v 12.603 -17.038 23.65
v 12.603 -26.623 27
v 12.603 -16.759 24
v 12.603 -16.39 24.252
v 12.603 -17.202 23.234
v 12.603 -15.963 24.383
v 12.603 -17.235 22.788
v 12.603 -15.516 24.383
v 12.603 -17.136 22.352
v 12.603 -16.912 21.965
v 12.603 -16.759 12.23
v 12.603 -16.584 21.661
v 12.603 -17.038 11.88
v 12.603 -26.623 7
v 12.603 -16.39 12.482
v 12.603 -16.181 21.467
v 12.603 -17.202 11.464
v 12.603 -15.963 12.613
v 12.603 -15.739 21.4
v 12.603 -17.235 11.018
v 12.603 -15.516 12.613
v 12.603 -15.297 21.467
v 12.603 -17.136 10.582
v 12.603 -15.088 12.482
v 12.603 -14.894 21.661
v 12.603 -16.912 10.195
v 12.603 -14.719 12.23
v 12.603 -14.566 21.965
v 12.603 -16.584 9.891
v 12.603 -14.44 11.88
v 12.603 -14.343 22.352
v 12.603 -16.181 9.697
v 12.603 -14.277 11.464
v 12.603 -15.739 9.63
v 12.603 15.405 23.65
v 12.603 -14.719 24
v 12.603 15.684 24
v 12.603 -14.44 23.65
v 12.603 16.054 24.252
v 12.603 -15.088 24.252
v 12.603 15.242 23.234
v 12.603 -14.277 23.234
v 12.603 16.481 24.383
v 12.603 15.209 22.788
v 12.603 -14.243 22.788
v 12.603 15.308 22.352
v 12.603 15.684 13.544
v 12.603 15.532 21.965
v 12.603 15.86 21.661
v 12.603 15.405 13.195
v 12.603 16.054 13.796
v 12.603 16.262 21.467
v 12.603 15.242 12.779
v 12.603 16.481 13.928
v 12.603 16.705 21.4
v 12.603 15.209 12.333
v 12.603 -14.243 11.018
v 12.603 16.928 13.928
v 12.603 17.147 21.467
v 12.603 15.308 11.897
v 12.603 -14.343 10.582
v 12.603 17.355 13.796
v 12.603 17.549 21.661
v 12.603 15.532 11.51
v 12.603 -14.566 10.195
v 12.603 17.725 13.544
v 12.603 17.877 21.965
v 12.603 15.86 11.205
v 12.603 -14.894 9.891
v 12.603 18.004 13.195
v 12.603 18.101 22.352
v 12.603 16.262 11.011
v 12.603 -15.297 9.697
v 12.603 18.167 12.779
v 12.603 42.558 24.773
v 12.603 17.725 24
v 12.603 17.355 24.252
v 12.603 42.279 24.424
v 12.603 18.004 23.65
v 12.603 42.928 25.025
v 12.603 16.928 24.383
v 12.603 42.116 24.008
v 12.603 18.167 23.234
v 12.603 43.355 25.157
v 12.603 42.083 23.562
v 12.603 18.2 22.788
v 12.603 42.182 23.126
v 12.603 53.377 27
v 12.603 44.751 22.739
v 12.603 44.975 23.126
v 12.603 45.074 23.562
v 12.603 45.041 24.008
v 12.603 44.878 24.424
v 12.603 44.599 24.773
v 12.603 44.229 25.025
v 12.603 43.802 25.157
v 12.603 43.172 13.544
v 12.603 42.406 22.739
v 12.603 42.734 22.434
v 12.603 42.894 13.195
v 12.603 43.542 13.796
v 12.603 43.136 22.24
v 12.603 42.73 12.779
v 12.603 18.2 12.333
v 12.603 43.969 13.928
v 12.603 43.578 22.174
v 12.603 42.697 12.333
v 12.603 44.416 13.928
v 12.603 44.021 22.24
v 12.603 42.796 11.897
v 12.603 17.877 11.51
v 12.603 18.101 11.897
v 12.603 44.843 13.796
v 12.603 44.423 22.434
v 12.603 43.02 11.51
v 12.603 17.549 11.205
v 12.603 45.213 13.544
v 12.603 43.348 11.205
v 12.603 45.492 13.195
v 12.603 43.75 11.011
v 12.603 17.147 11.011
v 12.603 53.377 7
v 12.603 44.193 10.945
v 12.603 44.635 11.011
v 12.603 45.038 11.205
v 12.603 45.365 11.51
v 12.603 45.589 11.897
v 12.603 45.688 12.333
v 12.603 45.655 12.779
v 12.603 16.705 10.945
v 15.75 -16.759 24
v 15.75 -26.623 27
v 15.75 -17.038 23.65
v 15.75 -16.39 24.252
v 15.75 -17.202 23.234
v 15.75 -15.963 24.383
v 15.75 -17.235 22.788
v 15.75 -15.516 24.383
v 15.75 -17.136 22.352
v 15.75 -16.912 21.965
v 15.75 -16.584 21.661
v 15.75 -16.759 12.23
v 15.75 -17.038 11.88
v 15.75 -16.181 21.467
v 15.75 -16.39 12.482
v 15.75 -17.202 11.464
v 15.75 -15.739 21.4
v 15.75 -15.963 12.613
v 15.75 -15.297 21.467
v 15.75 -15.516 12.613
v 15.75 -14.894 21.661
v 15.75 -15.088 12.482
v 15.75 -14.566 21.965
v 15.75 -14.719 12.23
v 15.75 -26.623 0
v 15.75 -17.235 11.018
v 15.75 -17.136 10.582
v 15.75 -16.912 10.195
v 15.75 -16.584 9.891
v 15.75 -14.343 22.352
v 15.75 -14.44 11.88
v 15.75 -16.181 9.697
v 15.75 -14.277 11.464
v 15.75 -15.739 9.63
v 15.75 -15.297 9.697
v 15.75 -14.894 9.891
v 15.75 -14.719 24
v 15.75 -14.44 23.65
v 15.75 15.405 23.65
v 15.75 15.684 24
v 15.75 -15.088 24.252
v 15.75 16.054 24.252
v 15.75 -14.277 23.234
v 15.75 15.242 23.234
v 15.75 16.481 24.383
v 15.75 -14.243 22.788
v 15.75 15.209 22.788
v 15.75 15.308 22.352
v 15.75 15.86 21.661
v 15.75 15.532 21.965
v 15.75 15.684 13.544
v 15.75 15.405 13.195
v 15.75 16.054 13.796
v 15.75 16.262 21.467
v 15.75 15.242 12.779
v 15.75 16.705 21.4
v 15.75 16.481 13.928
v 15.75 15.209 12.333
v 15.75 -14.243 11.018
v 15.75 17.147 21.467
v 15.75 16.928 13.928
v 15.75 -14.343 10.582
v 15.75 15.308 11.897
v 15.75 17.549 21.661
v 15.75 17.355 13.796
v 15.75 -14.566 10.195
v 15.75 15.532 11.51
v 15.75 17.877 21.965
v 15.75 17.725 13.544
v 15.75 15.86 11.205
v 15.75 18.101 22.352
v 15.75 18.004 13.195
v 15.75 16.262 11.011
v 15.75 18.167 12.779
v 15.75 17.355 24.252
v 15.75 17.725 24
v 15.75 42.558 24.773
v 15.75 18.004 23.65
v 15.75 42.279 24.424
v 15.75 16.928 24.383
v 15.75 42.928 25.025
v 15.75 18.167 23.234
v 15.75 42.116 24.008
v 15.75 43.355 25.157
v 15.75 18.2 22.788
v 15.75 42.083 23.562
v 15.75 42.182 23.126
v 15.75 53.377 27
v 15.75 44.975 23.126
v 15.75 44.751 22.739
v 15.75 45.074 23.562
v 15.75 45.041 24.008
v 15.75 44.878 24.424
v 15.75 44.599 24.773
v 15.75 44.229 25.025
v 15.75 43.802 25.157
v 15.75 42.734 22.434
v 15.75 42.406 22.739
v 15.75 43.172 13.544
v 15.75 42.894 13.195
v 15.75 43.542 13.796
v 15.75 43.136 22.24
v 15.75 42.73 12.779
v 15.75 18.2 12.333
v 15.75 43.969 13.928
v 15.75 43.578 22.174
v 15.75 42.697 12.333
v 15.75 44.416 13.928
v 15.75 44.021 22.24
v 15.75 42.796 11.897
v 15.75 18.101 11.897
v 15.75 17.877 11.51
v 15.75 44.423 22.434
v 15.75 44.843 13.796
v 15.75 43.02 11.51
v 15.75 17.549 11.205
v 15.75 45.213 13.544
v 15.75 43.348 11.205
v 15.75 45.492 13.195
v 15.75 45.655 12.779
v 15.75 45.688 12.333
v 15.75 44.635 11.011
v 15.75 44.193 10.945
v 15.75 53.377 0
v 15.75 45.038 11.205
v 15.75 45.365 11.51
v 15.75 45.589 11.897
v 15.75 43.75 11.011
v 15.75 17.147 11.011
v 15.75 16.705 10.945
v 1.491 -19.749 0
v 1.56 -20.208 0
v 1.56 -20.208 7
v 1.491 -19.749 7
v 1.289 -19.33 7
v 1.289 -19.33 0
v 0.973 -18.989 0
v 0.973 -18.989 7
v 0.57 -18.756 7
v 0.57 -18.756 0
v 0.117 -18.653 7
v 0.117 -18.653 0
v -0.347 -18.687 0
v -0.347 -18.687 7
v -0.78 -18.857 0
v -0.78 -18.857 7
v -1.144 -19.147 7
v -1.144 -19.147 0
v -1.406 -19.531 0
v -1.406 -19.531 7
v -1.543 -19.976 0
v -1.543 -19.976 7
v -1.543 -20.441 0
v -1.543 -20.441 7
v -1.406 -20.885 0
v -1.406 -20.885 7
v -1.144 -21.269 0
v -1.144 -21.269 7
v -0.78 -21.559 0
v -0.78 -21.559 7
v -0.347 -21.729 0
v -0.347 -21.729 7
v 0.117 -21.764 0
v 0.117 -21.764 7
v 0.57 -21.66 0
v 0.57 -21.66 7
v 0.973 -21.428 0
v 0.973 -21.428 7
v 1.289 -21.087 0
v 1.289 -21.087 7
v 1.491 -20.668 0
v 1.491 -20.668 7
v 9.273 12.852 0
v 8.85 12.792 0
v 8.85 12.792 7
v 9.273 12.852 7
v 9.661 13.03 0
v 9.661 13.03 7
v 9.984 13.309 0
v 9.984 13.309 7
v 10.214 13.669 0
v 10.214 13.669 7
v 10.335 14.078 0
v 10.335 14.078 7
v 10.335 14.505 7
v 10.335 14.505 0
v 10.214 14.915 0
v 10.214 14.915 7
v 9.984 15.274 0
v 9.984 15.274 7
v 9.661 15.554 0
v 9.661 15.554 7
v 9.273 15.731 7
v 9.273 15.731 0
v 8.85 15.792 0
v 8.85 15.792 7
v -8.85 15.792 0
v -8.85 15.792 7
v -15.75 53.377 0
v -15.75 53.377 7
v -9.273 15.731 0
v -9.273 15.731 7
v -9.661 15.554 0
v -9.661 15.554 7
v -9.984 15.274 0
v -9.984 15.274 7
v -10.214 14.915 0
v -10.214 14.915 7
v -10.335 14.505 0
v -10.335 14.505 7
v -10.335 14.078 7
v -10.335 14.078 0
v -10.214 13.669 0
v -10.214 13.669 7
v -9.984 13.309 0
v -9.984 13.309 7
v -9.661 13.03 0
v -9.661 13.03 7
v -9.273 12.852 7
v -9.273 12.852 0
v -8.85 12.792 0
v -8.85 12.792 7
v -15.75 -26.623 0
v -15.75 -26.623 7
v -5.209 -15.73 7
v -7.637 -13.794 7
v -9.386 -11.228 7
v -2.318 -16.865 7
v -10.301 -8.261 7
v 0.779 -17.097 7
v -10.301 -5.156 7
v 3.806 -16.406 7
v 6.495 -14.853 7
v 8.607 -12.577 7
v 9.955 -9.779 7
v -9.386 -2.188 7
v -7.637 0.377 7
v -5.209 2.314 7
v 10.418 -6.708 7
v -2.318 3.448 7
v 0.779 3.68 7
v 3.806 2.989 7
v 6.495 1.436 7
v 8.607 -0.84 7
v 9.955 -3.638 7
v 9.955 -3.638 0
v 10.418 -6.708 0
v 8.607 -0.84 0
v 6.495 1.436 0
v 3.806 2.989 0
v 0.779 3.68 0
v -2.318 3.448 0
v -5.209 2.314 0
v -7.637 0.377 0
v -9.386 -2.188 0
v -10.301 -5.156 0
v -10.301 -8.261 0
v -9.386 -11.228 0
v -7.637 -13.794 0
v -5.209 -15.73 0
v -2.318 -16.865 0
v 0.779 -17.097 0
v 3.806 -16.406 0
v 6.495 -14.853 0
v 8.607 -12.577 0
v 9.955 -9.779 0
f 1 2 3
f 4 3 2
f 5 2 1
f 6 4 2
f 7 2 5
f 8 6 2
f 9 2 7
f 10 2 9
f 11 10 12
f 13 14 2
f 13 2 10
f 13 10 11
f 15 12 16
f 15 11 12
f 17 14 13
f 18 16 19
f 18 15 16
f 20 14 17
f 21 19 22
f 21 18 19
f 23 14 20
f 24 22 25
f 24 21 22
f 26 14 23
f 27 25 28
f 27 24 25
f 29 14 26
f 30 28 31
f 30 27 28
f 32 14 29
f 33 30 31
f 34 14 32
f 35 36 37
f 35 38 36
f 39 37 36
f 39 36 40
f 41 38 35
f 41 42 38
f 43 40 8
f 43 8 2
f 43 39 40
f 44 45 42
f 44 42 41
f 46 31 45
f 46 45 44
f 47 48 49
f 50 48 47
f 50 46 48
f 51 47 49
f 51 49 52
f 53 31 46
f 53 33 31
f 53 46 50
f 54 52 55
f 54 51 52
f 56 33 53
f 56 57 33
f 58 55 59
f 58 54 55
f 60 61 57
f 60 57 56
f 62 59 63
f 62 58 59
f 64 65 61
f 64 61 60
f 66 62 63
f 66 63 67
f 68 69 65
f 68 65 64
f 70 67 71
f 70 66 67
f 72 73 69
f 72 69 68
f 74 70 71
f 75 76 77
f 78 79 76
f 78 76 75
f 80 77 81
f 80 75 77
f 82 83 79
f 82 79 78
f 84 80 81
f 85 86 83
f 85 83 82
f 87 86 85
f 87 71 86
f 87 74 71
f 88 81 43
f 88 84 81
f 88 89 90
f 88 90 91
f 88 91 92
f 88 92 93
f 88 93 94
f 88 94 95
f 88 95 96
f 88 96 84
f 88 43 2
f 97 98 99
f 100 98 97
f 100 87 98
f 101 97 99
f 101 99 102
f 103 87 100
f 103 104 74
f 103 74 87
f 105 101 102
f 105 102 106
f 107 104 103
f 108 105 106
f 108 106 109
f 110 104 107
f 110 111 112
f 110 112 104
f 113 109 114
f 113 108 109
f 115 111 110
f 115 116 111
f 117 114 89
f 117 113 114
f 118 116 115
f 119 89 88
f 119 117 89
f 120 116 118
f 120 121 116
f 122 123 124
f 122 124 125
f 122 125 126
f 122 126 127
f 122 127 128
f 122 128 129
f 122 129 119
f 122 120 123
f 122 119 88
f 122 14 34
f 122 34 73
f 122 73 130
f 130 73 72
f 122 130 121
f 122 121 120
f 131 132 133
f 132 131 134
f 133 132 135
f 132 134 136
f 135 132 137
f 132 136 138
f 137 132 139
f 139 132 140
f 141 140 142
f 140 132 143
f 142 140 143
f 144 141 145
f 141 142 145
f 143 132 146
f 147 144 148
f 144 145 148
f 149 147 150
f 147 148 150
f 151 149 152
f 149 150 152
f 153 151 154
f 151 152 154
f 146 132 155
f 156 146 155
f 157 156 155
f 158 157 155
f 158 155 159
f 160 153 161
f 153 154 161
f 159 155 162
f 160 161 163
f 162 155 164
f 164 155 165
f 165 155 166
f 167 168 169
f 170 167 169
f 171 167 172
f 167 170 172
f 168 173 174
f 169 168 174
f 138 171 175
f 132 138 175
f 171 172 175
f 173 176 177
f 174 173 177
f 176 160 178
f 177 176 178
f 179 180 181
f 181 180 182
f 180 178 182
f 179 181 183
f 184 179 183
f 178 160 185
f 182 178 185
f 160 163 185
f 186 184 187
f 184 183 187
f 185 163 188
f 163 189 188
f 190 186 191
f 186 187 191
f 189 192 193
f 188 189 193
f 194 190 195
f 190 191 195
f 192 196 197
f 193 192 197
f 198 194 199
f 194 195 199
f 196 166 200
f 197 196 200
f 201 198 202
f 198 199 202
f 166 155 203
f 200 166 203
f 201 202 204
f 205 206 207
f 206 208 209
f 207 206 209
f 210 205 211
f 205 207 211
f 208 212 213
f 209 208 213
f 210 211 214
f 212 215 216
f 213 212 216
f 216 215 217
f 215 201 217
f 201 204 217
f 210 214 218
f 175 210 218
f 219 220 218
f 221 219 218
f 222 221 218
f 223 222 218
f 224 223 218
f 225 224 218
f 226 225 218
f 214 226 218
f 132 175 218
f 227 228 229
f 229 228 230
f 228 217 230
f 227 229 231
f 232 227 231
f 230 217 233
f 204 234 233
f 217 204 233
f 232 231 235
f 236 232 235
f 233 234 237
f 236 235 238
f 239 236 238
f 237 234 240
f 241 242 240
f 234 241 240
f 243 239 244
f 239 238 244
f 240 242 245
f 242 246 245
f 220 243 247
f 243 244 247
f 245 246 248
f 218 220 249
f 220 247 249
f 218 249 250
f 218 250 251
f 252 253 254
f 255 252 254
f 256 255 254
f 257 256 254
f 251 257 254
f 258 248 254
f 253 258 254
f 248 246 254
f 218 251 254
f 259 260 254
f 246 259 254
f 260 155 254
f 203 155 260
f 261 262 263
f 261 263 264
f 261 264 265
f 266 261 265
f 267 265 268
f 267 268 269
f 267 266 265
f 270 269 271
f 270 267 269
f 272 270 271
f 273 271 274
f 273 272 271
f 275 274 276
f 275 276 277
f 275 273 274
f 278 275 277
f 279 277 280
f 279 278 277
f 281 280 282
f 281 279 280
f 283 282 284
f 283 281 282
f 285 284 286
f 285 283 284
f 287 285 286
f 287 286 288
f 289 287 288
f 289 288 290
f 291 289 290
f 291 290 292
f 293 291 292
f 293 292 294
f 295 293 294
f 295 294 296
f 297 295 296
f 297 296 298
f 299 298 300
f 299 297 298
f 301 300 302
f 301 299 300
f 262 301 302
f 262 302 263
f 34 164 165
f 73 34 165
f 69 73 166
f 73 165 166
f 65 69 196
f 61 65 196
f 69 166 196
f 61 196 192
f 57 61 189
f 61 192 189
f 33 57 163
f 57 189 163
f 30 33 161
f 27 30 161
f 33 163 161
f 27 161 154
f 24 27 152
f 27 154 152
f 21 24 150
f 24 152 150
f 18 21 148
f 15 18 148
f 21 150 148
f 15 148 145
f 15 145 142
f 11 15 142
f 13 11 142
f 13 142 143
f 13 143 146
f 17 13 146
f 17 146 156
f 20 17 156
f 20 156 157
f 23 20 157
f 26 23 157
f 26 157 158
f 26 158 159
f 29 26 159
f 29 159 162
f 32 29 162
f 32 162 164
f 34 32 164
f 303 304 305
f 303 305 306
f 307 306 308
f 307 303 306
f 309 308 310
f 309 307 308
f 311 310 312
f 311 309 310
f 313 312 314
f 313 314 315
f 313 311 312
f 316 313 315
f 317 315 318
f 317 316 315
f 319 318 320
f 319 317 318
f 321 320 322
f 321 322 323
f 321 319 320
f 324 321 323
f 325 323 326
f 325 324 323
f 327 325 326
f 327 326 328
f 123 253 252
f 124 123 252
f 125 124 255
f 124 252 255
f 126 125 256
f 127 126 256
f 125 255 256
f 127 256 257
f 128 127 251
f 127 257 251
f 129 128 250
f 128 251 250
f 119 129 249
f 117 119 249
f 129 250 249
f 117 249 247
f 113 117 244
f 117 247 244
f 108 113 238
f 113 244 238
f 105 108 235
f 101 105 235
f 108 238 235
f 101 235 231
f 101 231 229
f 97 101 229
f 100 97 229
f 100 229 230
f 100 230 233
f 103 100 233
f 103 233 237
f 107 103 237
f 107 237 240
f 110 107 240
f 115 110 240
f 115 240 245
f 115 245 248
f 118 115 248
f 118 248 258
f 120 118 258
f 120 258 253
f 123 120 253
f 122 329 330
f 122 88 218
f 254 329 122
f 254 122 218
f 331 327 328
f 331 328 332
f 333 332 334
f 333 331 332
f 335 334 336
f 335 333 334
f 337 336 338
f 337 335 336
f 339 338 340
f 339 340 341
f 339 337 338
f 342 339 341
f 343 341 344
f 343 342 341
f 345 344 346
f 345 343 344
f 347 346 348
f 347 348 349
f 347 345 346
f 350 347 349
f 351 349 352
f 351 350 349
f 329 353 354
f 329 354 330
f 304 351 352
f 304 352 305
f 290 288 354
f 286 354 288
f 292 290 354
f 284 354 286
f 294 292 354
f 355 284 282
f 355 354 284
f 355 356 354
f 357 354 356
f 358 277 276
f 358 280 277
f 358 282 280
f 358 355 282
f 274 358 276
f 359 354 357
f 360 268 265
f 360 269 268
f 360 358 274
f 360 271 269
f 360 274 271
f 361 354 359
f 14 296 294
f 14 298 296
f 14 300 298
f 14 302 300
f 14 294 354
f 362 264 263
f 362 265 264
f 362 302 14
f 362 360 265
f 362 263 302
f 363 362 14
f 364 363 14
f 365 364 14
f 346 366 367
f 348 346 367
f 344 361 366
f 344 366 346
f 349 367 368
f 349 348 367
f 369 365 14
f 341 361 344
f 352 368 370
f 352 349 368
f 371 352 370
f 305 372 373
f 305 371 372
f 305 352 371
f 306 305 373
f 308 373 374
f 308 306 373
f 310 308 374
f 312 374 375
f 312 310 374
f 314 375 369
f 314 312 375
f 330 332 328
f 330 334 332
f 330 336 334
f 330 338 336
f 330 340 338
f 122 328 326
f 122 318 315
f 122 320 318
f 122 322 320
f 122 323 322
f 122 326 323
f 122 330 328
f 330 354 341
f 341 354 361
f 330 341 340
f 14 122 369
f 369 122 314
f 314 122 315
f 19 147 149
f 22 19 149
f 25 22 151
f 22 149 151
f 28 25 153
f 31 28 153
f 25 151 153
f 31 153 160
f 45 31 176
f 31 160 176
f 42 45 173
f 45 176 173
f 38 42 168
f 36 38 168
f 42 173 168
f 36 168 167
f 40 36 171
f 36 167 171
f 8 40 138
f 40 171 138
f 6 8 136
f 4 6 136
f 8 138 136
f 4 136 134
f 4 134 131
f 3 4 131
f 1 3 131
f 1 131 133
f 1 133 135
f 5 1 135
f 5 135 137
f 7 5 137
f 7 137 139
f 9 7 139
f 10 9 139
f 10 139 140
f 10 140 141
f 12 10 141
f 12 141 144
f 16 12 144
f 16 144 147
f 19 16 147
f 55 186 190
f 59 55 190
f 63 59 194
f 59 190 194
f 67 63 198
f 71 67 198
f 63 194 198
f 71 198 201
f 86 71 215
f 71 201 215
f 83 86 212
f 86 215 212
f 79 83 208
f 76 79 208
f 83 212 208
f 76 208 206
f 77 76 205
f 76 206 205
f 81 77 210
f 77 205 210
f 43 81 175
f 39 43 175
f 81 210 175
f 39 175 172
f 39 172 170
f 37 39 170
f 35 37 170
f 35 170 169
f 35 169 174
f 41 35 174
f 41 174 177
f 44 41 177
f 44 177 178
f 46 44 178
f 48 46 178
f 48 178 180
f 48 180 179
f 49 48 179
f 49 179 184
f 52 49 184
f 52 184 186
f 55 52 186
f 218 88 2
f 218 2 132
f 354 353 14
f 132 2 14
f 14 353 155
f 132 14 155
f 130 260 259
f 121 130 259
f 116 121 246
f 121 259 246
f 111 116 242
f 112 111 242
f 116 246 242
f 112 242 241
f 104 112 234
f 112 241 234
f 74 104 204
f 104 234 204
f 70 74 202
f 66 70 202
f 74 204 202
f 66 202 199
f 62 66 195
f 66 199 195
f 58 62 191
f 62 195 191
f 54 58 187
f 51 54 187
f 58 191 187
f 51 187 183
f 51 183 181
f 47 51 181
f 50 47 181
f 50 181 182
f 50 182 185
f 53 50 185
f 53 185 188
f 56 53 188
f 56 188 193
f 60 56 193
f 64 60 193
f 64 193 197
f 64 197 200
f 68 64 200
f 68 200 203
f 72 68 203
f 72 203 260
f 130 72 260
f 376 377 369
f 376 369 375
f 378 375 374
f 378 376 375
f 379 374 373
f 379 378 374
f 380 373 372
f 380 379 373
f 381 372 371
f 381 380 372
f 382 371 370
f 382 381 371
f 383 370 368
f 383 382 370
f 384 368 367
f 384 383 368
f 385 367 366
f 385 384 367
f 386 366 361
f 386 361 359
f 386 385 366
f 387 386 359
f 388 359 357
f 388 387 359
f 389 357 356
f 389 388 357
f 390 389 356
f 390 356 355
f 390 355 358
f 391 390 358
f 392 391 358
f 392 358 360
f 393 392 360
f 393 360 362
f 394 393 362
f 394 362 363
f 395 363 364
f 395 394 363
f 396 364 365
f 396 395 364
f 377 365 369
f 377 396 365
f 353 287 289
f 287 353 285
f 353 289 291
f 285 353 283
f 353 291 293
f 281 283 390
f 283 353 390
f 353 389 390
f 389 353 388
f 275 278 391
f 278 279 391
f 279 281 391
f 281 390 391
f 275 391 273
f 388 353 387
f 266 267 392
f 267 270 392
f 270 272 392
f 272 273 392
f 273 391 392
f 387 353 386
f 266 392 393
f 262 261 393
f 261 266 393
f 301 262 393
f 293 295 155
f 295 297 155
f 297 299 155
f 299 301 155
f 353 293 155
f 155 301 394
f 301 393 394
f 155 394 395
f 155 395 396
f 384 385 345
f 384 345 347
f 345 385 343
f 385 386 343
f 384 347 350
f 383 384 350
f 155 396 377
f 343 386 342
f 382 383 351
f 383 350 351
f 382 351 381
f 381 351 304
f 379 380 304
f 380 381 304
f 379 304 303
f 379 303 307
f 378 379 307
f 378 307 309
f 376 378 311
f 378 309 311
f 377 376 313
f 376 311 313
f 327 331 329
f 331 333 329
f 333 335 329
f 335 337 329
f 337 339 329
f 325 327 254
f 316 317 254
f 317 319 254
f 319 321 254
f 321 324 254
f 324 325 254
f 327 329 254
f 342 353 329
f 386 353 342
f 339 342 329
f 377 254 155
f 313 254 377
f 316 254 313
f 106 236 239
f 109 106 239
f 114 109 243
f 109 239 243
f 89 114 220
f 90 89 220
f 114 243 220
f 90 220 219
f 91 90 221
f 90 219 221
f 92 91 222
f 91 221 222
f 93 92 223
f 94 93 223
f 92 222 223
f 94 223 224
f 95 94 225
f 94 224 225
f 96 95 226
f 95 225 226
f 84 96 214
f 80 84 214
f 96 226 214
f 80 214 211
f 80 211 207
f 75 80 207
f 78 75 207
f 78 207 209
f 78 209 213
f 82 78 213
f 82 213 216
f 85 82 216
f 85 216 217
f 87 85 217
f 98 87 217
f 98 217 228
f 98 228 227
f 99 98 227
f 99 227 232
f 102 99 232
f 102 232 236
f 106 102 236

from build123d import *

# Parameters (mm, degrees)
SKETCH_1_W      = 31.500863908
SKETCH_1_H      = 80
SKETCH_1_R      = 10.417524335
SKETCH_1_R_2    = 1.56
EXTRUDE_1_DEPTH = 7
SKETCH_5_W      = 3.14774975
SKETCH_5_H      = 80
EXTRUDE_2_DEPTH = 27
MM_1_D          = 3
MM_1_DEPTH      = 3.14774975


with BuildPart() as part:
    # 草图1 → 凸台-拉伸1 (new body)
    with BuildSketch(Plane.XY):
        with Locations((0, 13.377078694)):
            Rectangle(SKETCH_1_W, SKETCH_1_H)
        with Locations((0, -6.708333333)):
            Circle(SKETCH_1_R, mode=Mode.SUBTRACT)
        with Locations((0, -20.208333333)):
            Circle(SKETCH_1_R_2, mode=Mode.SUBTRACT)
        with BuildLine():
            Line((8.85, 15.791666667), (-8.85, 15.791666667))
            ThreePointArc((-8.85, 15.791666667), (-10.35, 14.291666667), (-8.85, 12.791666667))
            Line((-8.85, 12.791666667), (8.85, 12.791666667))
            ThreePointArc((8.85, 12.791666667), (10.35, 14.291666667), (8.85, 15.791666667))
        make_face(mode=Mode.SUBTRACT)
    extrude(amount=EXTRUDE_1_DEPTH)

    # 草图5 → 凸台-拉伸2 (add)
    with BuildSketch(Plane.XY):
        with Locations((14.176557079, 13.377078694)):
            Rectangle(SKETCH_5_W, SKETCH_5_H)
    extrude(amount=EXTRUDE_2_DEPTH)

    # 大小mm 暗销孔1
    with Locations(Plane.ZY.offset(-12.602682204)):
        with Locations((12.444794173, 44.192540423), (23.673777791, 43.57849825), (11.130072788, -15.739218974), (22.900107862, -15.739218974), (12.444794173, 16.704513785), (22.900107862, 16.704513785)):
            Hole(MM_1_D / 2, depth=MM_1_DEPTH)


solid = part.part
